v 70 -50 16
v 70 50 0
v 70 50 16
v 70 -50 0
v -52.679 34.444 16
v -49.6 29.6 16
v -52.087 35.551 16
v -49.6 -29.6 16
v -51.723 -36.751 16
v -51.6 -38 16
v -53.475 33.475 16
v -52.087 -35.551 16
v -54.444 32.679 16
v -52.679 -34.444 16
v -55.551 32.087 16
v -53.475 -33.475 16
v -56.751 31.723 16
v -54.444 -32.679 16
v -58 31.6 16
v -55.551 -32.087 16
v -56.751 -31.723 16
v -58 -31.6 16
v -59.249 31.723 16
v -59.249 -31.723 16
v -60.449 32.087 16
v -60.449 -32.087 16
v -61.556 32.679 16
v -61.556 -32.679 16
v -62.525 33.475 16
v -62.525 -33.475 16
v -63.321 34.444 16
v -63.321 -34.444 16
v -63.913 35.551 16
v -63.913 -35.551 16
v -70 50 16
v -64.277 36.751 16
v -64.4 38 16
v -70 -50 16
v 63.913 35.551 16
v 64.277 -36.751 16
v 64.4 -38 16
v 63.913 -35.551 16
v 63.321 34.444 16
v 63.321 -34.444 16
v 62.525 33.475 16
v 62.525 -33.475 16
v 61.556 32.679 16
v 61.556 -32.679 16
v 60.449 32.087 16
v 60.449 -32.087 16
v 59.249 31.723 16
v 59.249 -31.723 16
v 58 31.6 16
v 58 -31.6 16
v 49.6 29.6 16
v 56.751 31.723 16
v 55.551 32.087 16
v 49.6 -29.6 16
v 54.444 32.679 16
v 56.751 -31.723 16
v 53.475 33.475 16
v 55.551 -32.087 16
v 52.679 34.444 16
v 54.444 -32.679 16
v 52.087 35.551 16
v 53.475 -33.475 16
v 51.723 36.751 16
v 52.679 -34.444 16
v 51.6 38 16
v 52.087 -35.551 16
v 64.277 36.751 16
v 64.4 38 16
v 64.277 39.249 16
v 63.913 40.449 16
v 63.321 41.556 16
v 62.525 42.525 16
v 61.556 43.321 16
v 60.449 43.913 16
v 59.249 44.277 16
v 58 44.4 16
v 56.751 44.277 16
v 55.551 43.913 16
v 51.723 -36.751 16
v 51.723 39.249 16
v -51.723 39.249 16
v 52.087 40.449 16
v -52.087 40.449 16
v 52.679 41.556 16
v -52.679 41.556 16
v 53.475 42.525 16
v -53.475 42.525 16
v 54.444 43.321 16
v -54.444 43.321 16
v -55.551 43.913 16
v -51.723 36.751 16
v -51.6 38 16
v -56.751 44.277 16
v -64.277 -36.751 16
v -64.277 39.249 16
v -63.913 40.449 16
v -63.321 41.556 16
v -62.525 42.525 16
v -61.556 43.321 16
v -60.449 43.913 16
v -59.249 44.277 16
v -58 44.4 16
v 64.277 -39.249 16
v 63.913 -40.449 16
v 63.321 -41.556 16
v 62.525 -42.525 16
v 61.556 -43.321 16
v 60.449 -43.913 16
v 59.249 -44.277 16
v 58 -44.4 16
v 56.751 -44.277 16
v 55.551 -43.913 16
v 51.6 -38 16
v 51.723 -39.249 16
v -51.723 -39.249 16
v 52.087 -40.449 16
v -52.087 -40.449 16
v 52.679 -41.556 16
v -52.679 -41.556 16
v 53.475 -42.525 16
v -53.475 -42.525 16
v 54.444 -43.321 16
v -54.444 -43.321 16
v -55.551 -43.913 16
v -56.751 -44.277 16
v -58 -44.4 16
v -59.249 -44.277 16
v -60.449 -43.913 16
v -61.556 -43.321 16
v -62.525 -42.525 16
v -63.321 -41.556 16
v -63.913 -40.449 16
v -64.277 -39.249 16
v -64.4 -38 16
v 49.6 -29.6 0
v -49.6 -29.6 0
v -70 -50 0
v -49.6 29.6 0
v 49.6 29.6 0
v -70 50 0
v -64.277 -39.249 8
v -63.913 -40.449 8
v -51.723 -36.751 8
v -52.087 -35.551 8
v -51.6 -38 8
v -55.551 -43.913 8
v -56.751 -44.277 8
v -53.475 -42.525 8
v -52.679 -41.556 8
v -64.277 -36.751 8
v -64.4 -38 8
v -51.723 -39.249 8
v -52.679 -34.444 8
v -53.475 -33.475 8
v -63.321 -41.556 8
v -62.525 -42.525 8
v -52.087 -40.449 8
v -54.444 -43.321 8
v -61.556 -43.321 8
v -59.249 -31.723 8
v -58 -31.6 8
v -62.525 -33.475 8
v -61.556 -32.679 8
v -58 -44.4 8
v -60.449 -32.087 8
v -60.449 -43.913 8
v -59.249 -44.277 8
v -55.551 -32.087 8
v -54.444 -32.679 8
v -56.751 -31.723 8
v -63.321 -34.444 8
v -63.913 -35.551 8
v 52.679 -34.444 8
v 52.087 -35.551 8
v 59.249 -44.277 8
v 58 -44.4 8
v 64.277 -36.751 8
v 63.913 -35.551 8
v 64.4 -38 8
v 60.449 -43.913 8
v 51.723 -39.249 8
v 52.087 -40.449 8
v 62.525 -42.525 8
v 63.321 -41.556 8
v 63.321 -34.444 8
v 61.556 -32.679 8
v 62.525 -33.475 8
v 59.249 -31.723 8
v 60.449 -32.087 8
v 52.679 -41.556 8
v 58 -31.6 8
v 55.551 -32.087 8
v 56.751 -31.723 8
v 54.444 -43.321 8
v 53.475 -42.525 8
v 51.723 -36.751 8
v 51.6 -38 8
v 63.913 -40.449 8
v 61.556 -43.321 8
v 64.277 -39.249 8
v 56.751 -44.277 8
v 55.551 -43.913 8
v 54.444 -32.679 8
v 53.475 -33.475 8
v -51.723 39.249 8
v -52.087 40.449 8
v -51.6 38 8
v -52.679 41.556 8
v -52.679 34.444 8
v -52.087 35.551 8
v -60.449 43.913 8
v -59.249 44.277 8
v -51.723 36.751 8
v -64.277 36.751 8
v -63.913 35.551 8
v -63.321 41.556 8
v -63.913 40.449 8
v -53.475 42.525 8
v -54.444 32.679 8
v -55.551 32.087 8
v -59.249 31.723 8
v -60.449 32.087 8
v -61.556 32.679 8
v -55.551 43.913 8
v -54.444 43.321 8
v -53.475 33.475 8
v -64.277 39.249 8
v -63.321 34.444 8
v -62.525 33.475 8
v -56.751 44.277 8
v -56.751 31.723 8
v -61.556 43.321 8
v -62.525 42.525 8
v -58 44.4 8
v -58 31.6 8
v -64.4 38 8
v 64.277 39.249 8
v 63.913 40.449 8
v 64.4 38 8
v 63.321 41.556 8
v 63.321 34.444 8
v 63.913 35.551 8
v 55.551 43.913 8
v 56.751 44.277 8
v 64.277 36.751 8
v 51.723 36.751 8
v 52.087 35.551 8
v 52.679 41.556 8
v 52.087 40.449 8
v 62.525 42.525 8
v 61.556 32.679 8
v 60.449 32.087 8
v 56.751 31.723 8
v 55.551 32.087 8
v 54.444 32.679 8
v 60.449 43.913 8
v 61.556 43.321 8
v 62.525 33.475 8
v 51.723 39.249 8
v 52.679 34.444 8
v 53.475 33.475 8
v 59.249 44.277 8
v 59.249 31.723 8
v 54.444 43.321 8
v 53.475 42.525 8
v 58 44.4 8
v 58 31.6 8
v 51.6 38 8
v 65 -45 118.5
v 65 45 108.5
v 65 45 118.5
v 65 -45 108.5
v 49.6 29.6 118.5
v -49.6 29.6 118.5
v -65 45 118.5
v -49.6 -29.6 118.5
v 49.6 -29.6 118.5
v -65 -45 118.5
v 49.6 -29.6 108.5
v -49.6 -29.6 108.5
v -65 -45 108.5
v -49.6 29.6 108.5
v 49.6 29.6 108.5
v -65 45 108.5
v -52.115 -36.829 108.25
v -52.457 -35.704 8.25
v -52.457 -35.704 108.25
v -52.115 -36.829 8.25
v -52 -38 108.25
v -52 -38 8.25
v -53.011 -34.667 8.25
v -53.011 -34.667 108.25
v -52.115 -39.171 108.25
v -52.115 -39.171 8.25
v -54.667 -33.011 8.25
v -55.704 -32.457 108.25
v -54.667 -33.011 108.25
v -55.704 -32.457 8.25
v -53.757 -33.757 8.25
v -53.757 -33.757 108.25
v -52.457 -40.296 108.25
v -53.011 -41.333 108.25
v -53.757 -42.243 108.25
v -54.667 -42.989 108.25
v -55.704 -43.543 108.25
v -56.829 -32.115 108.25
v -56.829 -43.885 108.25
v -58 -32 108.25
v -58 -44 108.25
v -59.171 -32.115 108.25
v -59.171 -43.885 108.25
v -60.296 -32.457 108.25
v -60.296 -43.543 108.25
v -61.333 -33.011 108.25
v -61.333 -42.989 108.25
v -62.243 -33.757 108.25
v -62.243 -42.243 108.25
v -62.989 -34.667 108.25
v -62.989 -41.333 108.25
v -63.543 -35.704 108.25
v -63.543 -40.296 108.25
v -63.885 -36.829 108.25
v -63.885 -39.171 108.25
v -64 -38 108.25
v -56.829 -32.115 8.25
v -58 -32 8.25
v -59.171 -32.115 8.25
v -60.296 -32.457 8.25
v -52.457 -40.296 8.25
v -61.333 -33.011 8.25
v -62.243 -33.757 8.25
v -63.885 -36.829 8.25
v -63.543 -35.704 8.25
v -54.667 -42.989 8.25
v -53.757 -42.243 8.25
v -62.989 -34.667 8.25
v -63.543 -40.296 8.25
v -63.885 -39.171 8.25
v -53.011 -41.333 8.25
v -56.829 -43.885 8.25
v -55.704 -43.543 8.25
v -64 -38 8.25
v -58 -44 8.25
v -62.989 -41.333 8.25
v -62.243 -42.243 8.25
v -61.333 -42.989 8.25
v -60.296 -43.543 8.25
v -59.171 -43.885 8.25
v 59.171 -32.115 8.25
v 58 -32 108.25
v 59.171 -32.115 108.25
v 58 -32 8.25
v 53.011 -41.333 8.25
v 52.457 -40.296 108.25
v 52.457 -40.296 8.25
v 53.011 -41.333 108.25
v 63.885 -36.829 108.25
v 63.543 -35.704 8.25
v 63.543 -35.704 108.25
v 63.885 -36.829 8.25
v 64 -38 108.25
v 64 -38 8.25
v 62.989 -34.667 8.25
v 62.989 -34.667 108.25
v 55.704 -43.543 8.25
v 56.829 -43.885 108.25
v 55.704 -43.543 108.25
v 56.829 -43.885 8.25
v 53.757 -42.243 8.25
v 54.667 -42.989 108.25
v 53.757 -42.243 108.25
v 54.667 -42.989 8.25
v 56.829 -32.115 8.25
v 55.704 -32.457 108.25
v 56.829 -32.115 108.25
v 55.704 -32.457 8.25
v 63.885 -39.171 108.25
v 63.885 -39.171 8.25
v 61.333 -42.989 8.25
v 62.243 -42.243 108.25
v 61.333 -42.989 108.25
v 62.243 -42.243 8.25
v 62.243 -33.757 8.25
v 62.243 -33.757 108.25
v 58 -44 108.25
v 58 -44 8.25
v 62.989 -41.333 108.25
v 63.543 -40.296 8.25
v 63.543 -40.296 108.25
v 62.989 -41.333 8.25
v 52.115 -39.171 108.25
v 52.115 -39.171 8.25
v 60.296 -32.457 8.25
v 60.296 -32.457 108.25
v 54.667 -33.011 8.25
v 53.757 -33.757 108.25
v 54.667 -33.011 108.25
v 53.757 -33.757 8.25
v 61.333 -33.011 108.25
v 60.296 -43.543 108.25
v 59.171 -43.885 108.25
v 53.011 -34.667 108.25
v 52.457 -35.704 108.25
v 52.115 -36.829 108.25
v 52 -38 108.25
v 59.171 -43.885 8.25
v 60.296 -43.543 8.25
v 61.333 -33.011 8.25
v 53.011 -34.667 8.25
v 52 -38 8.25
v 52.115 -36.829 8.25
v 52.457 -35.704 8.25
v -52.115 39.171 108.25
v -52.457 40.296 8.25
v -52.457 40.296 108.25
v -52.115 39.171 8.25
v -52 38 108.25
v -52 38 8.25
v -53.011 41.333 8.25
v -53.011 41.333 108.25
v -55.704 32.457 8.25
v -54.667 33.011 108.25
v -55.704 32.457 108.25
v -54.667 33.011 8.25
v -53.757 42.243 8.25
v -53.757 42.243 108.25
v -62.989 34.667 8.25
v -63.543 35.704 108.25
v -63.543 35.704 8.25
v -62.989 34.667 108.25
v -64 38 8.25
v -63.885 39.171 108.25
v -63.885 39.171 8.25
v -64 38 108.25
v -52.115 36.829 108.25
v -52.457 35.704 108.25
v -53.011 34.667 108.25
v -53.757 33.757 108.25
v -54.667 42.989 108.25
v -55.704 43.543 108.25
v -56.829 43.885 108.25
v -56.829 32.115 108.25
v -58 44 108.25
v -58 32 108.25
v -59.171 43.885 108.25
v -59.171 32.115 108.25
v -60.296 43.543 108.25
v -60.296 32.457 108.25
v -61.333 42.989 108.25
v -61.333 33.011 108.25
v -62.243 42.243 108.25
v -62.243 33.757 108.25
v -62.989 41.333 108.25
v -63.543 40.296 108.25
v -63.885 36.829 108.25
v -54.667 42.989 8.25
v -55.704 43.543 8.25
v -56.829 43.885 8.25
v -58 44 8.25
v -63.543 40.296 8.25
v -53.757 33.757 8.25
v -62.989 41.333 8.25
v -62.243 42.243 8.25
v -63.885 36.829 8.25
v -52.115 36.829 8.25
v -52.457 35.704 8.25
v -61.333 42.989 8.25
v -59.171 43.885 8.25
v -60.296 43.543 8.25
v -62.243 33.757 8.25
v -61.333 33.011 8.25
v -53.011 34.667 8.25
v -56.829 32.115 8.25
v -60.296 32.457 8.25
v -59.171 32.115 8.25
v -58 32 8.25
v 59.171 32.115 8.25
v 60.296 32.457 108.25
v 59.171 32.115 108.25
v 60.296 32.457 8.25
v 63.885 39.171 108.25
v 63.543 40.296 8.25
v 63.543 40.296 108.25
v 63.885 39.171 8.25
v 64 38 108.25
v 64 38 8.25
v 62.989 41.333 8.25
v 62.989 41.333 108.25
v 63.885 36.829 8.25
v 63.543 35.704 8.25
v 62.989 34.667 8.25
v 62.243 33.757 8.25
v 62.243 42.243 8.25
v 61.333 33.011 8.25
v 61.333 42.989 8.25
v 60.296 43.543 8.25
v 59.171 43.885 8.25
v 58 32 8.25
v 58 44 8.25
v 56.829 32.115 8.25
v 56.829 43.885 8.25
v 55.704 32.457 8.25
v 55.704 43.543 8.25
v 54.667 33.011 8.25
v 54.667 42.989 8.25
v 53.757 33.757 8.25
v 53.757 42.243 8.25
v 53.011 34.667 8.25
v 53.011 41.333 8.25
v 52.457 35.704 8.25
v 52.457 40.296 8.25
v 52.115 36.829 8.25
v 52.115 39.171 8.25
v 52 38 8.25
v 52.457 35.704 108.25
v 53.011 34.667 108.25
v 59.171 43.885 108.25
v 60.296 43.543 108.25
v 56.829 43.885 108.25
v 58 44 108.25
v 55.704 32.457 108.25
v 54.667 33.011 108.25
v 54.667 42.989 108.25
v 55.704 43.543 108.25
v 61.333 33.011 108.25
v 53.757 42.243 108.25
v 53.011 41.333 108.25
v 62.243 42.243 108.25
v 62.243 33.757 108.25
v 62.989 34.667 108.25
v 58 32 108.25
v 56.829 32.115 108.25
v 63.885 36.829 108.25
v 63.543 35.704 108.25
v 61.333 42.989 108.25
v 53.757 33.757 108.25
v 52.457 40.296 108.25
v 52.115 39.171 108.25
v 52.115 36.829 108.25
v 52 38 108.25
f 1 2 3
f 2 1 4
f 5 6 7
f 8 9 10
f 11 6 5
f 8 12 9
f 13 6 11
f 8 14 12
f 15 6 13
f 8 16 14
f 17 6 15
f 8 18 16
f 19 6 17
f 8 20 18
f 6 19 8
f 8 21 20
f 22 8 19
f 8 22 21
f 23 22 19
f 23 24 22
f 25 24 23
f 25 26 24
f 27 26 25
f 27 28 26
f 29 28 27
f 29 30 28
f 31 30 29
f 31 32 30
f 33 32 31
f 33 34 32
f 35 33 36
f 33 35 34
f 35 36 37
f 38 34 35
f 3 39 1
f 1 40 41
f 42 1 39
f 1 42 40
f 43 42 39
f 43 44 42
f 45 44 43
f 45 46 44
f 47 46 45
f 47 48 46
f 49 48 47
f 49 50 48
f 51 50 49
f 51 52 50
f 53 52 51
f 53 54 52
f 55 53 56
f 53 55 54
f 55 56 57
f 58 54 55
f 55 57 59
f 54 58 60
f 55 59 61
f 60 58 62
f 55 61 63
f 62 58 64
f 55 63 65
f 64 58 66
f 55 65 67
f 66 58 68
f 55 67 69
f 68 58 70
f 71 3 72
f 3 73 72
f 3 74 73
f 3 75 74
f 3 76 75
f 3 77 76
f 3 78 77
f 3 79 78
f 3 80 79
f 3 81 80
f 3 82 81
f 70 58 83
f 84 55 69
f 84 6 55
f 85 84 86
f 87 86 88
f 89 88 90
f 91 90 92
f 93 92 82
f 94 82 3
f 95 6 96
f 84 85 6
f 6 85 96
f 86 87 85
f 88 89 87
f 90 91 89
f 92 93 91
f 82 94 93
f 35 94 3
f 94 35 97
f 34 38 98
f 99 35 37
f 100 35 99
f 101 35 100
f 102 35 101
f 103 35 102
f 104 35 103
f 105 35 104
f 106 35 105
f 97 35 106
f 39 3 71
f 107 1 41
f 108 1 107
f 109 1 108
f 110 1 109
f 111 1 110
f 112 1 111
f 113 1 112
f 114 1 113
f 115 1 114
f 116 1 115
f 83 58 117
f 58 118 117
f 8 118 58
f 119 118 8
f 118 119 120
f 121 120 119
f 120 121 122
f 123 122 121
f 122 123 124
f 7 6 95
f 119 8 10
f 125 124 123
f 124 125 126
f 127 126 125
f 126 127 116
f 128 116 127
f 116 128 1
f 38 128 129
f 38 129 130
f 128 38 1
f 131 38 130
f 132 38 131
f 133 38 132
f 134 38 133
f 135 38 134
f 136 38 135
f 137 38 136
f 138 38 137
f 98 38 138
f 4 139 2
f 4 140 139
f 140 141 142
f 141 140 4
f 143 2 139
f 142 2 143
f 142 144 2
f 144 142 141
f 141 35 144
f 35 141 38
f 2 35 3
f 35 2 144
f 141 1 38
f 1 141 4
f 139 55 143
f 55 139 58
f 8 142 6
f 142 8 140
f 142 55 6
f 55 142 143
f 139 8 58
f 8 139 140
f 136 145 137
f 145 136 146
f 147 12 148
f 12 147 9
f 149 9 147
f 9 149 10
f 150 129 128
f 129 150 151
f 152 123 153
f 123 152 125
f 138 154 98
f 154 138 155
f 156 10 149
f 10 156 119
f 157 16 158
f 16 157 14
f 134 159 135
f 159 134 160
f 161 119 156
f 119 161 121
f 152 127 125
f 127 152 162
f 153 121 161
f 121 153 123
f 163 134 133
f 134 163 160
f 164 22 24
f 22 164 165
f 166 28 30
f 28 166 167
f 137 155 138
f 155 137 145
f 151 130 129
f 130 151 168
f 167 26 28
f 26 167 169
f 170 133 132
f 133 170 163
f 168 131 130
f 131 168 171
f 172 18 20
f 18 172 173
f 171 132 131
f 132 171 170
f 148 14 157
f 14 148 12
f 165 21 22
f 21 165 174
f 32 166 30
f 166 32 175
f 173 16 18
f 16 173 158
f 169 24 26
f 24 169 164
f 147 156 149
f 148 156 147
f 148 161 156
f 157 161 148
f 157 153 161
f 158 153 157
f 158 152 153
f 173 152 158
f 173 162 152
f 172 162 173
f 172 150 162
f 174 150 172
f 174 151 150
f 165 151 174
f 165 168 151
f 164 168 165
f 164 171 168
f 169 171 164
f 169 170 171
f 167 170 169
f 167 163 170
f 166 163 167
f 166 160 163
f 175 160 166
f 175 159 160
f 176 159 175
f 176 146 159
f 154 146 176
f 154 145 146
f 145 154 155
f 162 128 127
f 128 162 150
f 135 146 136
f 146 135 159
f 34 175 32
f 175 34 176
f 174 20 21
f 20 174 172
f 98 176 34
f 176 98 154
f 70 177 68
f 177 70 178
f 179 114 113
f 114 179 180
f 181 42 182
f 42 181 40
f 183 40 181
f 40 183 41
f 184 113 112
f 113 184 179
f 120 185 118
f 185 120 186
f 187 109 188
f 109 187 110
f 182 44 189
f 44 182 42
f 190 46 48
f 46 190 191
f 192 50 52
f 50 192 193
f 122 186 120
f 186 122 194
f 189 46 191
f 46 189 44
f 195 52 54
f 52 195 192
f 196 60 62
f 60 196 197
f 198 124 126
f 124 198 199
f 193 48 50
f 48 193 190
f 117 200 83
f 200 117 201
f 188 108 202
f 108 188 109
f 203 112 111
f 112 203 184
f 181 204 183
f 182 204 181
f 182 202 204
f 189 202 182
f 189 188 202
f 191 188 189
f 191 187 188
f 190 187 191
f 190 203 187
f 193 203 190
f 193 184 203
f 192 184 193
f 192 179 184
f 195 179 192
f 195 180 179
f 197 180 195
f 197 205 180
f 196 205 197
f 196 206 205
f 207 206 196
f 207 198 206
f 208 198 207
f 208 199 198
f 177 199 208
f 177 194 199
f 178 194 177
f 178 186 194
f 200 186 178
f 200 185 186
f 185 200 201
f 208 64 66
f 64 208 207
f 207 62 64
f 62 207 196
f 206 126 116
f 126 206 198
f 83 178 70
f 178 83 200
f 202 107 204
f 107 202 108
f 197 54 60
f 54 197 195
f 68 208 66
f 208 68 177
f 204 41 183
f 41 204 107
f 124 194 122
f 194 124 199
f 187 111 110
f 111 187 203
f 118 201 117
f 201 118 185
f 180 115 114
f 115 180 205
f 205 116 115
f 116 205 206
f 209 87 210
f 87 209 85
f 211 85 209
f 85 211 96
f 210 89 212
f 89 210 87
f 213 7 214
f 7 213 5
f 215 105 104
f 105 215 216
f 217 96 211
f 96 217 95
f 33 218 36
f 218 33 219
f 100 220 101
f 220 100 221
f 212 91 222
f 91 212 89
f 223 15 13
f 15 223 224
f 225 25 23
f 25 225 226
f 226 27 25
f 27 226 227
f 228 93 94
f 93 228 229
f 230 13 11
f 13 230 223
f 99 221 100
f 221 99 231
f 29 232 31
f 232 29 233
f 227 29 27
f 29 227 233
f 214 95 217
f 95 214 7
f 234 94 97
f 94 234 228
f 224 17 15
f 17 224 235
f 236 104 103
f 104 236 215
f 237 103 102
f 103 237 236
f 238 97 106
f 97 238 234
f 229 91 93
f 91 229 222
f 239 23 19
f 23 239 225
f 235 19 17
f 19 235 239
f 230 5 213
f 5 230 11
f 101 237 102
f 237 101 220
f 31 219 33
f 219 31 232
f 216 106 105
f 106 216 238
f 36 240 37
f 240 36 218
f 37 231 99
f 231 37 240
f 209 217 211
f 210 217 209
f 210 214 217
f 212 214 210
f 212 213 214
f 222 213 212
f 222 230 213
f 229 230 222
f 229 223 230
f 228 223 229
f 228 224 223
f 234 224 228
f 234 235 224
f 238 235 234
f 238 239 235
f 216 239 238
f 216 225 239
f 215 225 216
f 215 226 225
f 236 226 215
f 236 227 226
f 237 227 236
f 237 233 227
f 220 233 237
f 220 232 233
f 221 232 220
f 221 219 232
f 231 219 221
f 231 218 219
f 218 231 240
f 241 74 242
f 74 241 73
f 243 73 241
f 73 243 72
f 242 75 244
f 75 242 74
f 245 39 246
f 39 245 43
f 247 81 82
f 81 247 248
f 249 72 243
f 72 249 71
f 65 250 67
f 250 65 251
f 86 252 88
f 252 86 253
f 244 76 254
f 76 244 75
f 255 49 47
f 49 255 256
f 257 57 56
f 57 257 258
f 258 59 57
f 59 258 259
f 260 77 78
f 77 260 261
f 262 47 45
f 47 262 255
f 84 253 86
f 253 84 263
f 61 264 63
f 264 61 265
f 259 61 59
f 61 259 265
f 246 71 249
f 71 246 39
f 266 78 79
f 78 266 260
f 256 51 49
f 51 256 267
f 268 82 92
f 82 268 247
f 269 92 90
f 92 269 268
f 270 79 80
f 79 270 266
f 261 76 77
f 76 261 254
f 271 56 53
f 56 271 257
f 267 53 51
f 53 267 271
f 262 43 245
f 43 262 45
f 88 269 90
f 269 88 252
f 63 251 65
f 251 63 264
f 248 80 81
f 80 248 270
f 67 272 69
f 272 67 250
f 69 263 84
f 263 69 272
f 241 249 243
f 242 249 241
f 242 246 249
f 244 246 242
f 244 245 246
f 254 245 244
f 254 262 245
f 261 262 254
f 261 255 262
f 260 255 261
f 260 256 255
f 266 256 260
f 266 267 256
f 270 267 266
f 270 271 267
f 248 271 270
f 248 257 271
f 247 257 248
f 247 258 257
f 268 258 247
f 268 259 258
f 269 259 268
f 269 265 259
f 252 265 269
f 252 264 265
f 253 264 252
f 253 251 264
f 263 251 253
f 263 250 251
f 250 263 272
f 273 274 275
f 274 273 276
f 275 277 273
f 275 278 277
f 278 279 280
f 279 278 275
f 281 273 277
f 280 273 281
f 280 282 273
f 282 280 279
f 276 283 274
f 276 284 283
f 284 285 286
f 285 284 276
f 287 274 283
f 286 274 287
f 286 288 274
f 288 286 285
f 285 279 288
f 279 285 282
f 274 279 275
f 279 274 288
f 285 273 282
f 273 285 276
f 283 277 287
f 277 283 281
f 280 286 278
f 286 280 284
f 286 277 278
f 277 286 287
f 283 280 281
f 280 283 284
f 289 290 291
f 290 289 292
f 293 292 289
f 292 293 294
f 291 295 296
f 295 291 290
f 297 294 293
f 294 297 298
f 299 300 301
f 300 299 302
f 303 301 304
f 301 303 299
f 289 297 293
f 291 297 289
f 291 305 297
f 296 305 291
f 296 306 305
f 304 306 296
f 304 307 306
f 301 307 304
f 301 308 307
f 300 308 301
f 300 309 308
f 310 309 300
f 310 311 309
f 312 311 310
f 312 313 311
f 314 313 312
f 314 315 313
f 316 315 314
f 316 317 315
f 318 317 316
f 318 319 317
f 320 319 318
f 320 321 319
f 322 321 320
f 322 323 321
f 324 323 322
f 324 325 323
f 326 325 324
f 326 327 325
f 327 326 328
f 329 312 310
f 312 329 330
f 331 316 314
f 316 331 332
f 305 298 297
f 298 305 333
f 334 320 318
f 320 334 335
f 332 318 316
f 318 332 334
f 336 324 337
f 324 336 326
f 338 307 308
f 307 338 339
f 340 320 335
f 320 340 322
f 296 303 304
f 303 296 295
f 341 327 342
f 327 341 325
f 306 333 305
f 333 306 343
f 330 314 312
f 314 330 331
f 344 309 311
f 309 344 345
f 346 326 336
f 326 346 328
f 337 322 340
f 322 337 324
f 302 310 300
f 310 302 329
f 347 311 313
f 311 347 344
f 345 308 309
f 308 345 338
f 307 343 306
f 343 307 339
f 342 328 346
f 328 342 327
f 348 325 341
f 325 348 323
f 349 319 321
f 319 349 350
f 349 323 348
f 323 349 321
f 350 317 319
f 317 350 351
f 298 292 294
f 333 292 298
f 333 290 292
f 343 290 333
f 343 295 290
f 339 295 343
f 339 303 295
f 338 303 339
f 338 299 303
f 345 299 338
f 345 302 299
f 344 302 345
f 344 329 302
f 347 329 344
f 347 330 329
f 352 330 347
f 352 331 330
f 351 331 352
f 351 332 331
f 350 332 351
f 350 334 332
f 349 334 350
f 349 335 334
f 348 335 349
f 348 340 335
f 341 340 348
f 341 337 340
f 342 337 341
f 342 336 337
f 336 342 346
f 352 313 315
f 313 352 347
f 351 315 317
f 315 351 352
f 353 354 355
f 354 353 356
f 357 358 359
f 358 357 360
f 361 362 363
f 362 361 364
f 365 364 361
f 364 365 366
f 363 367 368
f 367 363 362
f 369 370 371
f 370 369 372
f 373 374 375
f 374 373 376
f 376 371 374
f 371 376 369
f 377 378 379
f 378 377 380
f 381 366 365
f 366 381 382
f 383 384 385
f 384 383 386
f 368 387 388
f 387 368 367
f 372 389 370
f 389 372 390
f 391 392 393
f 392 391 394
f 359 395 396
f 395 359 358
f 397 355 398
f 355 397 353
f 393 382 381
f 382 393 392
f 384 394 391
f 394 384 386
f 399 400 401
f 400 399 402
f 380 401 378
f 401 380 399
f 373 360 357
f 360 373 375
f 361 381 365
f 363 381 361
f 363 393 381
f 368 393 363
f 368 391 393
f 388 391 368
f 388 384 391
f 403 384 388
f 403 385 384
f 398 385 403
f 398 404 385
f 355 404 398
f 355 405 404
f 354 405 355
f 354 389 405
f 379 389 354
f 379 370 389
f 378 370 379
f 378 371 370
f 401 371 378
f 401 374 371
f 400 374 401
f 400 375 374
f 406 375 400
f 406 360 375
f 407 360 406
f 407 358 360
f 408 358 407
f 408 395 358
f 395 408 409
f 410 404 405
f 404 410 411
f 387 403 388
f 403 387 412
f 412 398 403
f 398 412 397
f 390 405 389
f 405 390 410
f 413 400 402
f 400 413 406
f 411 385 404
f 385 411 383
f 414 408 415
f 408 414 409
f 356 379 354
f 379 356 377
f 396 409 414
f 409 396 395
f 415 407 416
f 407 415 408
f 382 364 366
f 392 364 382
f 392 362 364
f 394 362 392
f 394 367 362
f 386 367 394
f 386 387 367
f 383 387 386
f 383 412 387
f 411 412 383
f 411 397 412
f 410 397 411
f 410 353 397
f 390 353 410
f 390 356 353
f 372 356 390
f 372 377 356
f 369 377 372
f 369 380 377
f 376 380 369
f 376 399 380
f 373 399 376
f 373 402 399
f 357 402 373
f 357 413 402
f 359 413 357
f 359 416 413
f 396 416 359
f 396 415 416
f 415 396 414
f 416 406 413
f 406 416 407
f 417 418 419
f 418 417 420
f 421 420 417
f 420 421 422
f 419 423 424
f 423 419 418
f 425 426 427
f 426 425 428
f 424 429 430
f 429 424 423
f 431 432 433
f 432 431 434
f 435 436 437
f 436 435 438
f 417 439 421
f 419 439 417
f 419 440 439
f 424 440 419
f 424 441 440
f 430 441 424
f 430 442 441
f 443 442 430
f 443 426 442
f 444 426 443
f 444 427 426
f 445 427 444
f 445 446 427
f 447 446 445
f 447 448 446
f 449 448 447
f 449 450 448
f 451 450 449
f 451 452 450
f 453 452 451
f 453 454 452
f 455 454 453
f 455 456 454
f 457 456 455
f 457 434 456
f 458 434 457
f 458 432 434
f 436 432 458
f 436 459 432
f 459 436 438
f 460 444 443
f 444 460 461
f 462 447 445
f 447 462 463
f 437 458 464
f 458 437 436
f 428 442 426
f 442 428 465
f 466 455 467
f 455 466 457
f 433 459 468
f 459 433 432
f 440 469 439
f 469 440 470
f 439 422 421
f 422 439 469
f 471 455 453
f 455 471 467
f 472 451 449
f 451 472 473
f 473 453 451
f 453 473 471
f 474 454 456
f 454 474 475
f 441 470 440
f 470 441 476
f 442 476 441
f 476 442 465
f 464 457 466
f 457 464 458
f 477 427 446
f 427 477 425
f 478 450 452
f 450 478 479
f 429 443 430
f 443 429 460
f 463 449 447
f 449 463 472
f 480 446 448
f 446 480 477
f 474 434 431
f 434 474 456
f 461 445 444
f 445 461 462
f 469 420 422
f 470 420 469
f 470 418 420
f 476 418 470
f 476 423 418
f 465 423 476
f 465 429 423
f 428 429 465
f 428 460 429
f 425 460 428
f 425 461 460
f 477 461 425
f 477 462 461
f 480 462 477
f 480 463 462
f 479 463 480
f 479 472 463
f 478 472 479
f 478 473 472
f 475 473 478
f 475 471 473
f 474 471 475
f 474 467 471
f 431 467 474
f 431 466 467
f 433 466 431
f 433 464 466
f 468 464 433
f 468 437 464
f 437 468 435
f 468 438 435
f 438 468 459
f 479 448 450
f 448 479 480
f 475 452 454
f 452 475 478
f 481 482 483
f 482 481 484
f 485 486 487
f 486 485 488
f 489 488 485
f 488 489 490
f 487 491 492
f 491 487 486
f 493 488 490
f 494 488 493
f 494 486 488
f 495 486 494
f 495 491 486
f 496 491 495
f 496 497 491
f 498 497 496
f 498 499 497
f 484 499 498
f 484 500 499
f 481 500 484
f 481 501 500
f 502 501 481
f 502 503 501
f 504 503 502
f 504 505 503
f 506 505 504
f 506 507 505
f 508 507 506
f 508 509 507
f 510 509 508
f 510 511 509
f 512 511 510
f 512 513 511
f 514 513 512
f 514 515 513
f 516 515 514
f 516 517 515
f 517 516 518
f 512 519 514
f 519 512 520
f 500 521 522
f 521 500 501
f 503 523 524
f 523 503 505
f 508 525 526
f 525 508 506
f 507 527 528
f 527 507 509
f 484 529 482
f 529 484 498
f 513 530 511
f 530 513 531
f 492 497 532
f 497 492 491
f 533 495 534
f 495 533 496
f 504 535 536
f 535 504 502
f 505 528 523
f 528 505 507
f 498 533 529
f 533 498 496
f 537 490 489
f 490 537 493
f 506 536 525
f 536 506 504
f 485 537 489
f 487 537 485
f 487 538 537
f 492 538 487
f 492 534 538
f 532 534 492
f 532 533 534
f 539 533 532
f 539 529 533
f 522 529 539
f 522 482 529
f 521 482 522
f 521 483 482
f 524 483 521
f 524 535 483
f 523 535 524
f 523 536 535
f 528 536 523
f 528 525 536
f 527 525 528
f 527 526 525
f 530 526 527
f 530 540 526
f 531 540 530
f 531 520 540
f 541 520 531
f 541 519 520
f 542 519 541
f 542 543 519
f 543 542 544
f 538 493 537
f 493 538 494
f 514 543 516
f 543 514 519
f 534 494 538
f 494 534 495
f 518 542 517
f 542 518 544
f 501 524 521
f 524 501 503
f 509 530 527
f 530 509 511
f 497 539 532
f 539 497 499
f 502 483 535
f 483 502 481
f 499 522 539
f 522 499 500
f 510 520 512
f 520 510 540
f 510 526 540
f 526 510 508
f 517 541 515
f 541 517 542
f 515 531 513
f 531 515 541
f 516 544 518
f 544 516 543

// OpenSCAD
$fn = 32;

// ------------------------------------------------------------------------
// Frame cube: base 140 x 100 mm, posts 100 mm tall
// Every part is its own module, assembly() places every instance.
// ------------------------------------------------------------------------

// --- part 1 ---
module base_frame() {
  difference() {
    translate([-70, -50, 0]) cube([140, 100, 16]);
    translate([-49.6, -29.6, -1]) cube([99.2, 59.2, 18]);
    translate([-58, -38, 8]) cylinder(h = 9, d = 12.8);
    translate([58, -38, 8]) cylinder(h = 9, d = 12.8);
    translate([-58, 38, 8]) cylinder(h = 9, d = 12.8);
    translate([58, 38, 8]) cylinder(h = 9, d = 12.8);
  }
}

// --- part 2 ---
module corner_post() {
  cylinder(h = 100, d = 12);
}

// --- part 3 ---
module top_frame() {
  difference() {
    translate([-65, -45, 0]) cube([130, 90, 10]);
    translate([-49.6, -29.6, -1]) cube([99.2, 59.2, 12]);
  }
}

// --- assembly ---
module assembly() {
  color([0.80, 0.24, 0.20]) translate([0, 0, 0]) rotate([0, 0, 0]) base_frame();
  color([0.20, 0.45, 0.75]) translate([-58, -38, 8.25]) rotate([0, 0, 0]) corner_post();
  color([0.25, 0.62, 0.32]) translate([58, -38, 8.25]) rotate([0, 0, 0]) corner_post();
  color([0.92, 0.70, 0.18]) translate([-58, 38, 8.25]) rotate([0, 0, 0]) corner_post();
  color([0.58, 0.35, 0.70]) translate([58, 38, 8.25]) rotate([0, 0, 0]) corner_post();
  color([0.16, 0.66, 0.66]) translate([0, 0, 108.5]) rotate([0, 0, 0]) top_frame();
}

assembly();
